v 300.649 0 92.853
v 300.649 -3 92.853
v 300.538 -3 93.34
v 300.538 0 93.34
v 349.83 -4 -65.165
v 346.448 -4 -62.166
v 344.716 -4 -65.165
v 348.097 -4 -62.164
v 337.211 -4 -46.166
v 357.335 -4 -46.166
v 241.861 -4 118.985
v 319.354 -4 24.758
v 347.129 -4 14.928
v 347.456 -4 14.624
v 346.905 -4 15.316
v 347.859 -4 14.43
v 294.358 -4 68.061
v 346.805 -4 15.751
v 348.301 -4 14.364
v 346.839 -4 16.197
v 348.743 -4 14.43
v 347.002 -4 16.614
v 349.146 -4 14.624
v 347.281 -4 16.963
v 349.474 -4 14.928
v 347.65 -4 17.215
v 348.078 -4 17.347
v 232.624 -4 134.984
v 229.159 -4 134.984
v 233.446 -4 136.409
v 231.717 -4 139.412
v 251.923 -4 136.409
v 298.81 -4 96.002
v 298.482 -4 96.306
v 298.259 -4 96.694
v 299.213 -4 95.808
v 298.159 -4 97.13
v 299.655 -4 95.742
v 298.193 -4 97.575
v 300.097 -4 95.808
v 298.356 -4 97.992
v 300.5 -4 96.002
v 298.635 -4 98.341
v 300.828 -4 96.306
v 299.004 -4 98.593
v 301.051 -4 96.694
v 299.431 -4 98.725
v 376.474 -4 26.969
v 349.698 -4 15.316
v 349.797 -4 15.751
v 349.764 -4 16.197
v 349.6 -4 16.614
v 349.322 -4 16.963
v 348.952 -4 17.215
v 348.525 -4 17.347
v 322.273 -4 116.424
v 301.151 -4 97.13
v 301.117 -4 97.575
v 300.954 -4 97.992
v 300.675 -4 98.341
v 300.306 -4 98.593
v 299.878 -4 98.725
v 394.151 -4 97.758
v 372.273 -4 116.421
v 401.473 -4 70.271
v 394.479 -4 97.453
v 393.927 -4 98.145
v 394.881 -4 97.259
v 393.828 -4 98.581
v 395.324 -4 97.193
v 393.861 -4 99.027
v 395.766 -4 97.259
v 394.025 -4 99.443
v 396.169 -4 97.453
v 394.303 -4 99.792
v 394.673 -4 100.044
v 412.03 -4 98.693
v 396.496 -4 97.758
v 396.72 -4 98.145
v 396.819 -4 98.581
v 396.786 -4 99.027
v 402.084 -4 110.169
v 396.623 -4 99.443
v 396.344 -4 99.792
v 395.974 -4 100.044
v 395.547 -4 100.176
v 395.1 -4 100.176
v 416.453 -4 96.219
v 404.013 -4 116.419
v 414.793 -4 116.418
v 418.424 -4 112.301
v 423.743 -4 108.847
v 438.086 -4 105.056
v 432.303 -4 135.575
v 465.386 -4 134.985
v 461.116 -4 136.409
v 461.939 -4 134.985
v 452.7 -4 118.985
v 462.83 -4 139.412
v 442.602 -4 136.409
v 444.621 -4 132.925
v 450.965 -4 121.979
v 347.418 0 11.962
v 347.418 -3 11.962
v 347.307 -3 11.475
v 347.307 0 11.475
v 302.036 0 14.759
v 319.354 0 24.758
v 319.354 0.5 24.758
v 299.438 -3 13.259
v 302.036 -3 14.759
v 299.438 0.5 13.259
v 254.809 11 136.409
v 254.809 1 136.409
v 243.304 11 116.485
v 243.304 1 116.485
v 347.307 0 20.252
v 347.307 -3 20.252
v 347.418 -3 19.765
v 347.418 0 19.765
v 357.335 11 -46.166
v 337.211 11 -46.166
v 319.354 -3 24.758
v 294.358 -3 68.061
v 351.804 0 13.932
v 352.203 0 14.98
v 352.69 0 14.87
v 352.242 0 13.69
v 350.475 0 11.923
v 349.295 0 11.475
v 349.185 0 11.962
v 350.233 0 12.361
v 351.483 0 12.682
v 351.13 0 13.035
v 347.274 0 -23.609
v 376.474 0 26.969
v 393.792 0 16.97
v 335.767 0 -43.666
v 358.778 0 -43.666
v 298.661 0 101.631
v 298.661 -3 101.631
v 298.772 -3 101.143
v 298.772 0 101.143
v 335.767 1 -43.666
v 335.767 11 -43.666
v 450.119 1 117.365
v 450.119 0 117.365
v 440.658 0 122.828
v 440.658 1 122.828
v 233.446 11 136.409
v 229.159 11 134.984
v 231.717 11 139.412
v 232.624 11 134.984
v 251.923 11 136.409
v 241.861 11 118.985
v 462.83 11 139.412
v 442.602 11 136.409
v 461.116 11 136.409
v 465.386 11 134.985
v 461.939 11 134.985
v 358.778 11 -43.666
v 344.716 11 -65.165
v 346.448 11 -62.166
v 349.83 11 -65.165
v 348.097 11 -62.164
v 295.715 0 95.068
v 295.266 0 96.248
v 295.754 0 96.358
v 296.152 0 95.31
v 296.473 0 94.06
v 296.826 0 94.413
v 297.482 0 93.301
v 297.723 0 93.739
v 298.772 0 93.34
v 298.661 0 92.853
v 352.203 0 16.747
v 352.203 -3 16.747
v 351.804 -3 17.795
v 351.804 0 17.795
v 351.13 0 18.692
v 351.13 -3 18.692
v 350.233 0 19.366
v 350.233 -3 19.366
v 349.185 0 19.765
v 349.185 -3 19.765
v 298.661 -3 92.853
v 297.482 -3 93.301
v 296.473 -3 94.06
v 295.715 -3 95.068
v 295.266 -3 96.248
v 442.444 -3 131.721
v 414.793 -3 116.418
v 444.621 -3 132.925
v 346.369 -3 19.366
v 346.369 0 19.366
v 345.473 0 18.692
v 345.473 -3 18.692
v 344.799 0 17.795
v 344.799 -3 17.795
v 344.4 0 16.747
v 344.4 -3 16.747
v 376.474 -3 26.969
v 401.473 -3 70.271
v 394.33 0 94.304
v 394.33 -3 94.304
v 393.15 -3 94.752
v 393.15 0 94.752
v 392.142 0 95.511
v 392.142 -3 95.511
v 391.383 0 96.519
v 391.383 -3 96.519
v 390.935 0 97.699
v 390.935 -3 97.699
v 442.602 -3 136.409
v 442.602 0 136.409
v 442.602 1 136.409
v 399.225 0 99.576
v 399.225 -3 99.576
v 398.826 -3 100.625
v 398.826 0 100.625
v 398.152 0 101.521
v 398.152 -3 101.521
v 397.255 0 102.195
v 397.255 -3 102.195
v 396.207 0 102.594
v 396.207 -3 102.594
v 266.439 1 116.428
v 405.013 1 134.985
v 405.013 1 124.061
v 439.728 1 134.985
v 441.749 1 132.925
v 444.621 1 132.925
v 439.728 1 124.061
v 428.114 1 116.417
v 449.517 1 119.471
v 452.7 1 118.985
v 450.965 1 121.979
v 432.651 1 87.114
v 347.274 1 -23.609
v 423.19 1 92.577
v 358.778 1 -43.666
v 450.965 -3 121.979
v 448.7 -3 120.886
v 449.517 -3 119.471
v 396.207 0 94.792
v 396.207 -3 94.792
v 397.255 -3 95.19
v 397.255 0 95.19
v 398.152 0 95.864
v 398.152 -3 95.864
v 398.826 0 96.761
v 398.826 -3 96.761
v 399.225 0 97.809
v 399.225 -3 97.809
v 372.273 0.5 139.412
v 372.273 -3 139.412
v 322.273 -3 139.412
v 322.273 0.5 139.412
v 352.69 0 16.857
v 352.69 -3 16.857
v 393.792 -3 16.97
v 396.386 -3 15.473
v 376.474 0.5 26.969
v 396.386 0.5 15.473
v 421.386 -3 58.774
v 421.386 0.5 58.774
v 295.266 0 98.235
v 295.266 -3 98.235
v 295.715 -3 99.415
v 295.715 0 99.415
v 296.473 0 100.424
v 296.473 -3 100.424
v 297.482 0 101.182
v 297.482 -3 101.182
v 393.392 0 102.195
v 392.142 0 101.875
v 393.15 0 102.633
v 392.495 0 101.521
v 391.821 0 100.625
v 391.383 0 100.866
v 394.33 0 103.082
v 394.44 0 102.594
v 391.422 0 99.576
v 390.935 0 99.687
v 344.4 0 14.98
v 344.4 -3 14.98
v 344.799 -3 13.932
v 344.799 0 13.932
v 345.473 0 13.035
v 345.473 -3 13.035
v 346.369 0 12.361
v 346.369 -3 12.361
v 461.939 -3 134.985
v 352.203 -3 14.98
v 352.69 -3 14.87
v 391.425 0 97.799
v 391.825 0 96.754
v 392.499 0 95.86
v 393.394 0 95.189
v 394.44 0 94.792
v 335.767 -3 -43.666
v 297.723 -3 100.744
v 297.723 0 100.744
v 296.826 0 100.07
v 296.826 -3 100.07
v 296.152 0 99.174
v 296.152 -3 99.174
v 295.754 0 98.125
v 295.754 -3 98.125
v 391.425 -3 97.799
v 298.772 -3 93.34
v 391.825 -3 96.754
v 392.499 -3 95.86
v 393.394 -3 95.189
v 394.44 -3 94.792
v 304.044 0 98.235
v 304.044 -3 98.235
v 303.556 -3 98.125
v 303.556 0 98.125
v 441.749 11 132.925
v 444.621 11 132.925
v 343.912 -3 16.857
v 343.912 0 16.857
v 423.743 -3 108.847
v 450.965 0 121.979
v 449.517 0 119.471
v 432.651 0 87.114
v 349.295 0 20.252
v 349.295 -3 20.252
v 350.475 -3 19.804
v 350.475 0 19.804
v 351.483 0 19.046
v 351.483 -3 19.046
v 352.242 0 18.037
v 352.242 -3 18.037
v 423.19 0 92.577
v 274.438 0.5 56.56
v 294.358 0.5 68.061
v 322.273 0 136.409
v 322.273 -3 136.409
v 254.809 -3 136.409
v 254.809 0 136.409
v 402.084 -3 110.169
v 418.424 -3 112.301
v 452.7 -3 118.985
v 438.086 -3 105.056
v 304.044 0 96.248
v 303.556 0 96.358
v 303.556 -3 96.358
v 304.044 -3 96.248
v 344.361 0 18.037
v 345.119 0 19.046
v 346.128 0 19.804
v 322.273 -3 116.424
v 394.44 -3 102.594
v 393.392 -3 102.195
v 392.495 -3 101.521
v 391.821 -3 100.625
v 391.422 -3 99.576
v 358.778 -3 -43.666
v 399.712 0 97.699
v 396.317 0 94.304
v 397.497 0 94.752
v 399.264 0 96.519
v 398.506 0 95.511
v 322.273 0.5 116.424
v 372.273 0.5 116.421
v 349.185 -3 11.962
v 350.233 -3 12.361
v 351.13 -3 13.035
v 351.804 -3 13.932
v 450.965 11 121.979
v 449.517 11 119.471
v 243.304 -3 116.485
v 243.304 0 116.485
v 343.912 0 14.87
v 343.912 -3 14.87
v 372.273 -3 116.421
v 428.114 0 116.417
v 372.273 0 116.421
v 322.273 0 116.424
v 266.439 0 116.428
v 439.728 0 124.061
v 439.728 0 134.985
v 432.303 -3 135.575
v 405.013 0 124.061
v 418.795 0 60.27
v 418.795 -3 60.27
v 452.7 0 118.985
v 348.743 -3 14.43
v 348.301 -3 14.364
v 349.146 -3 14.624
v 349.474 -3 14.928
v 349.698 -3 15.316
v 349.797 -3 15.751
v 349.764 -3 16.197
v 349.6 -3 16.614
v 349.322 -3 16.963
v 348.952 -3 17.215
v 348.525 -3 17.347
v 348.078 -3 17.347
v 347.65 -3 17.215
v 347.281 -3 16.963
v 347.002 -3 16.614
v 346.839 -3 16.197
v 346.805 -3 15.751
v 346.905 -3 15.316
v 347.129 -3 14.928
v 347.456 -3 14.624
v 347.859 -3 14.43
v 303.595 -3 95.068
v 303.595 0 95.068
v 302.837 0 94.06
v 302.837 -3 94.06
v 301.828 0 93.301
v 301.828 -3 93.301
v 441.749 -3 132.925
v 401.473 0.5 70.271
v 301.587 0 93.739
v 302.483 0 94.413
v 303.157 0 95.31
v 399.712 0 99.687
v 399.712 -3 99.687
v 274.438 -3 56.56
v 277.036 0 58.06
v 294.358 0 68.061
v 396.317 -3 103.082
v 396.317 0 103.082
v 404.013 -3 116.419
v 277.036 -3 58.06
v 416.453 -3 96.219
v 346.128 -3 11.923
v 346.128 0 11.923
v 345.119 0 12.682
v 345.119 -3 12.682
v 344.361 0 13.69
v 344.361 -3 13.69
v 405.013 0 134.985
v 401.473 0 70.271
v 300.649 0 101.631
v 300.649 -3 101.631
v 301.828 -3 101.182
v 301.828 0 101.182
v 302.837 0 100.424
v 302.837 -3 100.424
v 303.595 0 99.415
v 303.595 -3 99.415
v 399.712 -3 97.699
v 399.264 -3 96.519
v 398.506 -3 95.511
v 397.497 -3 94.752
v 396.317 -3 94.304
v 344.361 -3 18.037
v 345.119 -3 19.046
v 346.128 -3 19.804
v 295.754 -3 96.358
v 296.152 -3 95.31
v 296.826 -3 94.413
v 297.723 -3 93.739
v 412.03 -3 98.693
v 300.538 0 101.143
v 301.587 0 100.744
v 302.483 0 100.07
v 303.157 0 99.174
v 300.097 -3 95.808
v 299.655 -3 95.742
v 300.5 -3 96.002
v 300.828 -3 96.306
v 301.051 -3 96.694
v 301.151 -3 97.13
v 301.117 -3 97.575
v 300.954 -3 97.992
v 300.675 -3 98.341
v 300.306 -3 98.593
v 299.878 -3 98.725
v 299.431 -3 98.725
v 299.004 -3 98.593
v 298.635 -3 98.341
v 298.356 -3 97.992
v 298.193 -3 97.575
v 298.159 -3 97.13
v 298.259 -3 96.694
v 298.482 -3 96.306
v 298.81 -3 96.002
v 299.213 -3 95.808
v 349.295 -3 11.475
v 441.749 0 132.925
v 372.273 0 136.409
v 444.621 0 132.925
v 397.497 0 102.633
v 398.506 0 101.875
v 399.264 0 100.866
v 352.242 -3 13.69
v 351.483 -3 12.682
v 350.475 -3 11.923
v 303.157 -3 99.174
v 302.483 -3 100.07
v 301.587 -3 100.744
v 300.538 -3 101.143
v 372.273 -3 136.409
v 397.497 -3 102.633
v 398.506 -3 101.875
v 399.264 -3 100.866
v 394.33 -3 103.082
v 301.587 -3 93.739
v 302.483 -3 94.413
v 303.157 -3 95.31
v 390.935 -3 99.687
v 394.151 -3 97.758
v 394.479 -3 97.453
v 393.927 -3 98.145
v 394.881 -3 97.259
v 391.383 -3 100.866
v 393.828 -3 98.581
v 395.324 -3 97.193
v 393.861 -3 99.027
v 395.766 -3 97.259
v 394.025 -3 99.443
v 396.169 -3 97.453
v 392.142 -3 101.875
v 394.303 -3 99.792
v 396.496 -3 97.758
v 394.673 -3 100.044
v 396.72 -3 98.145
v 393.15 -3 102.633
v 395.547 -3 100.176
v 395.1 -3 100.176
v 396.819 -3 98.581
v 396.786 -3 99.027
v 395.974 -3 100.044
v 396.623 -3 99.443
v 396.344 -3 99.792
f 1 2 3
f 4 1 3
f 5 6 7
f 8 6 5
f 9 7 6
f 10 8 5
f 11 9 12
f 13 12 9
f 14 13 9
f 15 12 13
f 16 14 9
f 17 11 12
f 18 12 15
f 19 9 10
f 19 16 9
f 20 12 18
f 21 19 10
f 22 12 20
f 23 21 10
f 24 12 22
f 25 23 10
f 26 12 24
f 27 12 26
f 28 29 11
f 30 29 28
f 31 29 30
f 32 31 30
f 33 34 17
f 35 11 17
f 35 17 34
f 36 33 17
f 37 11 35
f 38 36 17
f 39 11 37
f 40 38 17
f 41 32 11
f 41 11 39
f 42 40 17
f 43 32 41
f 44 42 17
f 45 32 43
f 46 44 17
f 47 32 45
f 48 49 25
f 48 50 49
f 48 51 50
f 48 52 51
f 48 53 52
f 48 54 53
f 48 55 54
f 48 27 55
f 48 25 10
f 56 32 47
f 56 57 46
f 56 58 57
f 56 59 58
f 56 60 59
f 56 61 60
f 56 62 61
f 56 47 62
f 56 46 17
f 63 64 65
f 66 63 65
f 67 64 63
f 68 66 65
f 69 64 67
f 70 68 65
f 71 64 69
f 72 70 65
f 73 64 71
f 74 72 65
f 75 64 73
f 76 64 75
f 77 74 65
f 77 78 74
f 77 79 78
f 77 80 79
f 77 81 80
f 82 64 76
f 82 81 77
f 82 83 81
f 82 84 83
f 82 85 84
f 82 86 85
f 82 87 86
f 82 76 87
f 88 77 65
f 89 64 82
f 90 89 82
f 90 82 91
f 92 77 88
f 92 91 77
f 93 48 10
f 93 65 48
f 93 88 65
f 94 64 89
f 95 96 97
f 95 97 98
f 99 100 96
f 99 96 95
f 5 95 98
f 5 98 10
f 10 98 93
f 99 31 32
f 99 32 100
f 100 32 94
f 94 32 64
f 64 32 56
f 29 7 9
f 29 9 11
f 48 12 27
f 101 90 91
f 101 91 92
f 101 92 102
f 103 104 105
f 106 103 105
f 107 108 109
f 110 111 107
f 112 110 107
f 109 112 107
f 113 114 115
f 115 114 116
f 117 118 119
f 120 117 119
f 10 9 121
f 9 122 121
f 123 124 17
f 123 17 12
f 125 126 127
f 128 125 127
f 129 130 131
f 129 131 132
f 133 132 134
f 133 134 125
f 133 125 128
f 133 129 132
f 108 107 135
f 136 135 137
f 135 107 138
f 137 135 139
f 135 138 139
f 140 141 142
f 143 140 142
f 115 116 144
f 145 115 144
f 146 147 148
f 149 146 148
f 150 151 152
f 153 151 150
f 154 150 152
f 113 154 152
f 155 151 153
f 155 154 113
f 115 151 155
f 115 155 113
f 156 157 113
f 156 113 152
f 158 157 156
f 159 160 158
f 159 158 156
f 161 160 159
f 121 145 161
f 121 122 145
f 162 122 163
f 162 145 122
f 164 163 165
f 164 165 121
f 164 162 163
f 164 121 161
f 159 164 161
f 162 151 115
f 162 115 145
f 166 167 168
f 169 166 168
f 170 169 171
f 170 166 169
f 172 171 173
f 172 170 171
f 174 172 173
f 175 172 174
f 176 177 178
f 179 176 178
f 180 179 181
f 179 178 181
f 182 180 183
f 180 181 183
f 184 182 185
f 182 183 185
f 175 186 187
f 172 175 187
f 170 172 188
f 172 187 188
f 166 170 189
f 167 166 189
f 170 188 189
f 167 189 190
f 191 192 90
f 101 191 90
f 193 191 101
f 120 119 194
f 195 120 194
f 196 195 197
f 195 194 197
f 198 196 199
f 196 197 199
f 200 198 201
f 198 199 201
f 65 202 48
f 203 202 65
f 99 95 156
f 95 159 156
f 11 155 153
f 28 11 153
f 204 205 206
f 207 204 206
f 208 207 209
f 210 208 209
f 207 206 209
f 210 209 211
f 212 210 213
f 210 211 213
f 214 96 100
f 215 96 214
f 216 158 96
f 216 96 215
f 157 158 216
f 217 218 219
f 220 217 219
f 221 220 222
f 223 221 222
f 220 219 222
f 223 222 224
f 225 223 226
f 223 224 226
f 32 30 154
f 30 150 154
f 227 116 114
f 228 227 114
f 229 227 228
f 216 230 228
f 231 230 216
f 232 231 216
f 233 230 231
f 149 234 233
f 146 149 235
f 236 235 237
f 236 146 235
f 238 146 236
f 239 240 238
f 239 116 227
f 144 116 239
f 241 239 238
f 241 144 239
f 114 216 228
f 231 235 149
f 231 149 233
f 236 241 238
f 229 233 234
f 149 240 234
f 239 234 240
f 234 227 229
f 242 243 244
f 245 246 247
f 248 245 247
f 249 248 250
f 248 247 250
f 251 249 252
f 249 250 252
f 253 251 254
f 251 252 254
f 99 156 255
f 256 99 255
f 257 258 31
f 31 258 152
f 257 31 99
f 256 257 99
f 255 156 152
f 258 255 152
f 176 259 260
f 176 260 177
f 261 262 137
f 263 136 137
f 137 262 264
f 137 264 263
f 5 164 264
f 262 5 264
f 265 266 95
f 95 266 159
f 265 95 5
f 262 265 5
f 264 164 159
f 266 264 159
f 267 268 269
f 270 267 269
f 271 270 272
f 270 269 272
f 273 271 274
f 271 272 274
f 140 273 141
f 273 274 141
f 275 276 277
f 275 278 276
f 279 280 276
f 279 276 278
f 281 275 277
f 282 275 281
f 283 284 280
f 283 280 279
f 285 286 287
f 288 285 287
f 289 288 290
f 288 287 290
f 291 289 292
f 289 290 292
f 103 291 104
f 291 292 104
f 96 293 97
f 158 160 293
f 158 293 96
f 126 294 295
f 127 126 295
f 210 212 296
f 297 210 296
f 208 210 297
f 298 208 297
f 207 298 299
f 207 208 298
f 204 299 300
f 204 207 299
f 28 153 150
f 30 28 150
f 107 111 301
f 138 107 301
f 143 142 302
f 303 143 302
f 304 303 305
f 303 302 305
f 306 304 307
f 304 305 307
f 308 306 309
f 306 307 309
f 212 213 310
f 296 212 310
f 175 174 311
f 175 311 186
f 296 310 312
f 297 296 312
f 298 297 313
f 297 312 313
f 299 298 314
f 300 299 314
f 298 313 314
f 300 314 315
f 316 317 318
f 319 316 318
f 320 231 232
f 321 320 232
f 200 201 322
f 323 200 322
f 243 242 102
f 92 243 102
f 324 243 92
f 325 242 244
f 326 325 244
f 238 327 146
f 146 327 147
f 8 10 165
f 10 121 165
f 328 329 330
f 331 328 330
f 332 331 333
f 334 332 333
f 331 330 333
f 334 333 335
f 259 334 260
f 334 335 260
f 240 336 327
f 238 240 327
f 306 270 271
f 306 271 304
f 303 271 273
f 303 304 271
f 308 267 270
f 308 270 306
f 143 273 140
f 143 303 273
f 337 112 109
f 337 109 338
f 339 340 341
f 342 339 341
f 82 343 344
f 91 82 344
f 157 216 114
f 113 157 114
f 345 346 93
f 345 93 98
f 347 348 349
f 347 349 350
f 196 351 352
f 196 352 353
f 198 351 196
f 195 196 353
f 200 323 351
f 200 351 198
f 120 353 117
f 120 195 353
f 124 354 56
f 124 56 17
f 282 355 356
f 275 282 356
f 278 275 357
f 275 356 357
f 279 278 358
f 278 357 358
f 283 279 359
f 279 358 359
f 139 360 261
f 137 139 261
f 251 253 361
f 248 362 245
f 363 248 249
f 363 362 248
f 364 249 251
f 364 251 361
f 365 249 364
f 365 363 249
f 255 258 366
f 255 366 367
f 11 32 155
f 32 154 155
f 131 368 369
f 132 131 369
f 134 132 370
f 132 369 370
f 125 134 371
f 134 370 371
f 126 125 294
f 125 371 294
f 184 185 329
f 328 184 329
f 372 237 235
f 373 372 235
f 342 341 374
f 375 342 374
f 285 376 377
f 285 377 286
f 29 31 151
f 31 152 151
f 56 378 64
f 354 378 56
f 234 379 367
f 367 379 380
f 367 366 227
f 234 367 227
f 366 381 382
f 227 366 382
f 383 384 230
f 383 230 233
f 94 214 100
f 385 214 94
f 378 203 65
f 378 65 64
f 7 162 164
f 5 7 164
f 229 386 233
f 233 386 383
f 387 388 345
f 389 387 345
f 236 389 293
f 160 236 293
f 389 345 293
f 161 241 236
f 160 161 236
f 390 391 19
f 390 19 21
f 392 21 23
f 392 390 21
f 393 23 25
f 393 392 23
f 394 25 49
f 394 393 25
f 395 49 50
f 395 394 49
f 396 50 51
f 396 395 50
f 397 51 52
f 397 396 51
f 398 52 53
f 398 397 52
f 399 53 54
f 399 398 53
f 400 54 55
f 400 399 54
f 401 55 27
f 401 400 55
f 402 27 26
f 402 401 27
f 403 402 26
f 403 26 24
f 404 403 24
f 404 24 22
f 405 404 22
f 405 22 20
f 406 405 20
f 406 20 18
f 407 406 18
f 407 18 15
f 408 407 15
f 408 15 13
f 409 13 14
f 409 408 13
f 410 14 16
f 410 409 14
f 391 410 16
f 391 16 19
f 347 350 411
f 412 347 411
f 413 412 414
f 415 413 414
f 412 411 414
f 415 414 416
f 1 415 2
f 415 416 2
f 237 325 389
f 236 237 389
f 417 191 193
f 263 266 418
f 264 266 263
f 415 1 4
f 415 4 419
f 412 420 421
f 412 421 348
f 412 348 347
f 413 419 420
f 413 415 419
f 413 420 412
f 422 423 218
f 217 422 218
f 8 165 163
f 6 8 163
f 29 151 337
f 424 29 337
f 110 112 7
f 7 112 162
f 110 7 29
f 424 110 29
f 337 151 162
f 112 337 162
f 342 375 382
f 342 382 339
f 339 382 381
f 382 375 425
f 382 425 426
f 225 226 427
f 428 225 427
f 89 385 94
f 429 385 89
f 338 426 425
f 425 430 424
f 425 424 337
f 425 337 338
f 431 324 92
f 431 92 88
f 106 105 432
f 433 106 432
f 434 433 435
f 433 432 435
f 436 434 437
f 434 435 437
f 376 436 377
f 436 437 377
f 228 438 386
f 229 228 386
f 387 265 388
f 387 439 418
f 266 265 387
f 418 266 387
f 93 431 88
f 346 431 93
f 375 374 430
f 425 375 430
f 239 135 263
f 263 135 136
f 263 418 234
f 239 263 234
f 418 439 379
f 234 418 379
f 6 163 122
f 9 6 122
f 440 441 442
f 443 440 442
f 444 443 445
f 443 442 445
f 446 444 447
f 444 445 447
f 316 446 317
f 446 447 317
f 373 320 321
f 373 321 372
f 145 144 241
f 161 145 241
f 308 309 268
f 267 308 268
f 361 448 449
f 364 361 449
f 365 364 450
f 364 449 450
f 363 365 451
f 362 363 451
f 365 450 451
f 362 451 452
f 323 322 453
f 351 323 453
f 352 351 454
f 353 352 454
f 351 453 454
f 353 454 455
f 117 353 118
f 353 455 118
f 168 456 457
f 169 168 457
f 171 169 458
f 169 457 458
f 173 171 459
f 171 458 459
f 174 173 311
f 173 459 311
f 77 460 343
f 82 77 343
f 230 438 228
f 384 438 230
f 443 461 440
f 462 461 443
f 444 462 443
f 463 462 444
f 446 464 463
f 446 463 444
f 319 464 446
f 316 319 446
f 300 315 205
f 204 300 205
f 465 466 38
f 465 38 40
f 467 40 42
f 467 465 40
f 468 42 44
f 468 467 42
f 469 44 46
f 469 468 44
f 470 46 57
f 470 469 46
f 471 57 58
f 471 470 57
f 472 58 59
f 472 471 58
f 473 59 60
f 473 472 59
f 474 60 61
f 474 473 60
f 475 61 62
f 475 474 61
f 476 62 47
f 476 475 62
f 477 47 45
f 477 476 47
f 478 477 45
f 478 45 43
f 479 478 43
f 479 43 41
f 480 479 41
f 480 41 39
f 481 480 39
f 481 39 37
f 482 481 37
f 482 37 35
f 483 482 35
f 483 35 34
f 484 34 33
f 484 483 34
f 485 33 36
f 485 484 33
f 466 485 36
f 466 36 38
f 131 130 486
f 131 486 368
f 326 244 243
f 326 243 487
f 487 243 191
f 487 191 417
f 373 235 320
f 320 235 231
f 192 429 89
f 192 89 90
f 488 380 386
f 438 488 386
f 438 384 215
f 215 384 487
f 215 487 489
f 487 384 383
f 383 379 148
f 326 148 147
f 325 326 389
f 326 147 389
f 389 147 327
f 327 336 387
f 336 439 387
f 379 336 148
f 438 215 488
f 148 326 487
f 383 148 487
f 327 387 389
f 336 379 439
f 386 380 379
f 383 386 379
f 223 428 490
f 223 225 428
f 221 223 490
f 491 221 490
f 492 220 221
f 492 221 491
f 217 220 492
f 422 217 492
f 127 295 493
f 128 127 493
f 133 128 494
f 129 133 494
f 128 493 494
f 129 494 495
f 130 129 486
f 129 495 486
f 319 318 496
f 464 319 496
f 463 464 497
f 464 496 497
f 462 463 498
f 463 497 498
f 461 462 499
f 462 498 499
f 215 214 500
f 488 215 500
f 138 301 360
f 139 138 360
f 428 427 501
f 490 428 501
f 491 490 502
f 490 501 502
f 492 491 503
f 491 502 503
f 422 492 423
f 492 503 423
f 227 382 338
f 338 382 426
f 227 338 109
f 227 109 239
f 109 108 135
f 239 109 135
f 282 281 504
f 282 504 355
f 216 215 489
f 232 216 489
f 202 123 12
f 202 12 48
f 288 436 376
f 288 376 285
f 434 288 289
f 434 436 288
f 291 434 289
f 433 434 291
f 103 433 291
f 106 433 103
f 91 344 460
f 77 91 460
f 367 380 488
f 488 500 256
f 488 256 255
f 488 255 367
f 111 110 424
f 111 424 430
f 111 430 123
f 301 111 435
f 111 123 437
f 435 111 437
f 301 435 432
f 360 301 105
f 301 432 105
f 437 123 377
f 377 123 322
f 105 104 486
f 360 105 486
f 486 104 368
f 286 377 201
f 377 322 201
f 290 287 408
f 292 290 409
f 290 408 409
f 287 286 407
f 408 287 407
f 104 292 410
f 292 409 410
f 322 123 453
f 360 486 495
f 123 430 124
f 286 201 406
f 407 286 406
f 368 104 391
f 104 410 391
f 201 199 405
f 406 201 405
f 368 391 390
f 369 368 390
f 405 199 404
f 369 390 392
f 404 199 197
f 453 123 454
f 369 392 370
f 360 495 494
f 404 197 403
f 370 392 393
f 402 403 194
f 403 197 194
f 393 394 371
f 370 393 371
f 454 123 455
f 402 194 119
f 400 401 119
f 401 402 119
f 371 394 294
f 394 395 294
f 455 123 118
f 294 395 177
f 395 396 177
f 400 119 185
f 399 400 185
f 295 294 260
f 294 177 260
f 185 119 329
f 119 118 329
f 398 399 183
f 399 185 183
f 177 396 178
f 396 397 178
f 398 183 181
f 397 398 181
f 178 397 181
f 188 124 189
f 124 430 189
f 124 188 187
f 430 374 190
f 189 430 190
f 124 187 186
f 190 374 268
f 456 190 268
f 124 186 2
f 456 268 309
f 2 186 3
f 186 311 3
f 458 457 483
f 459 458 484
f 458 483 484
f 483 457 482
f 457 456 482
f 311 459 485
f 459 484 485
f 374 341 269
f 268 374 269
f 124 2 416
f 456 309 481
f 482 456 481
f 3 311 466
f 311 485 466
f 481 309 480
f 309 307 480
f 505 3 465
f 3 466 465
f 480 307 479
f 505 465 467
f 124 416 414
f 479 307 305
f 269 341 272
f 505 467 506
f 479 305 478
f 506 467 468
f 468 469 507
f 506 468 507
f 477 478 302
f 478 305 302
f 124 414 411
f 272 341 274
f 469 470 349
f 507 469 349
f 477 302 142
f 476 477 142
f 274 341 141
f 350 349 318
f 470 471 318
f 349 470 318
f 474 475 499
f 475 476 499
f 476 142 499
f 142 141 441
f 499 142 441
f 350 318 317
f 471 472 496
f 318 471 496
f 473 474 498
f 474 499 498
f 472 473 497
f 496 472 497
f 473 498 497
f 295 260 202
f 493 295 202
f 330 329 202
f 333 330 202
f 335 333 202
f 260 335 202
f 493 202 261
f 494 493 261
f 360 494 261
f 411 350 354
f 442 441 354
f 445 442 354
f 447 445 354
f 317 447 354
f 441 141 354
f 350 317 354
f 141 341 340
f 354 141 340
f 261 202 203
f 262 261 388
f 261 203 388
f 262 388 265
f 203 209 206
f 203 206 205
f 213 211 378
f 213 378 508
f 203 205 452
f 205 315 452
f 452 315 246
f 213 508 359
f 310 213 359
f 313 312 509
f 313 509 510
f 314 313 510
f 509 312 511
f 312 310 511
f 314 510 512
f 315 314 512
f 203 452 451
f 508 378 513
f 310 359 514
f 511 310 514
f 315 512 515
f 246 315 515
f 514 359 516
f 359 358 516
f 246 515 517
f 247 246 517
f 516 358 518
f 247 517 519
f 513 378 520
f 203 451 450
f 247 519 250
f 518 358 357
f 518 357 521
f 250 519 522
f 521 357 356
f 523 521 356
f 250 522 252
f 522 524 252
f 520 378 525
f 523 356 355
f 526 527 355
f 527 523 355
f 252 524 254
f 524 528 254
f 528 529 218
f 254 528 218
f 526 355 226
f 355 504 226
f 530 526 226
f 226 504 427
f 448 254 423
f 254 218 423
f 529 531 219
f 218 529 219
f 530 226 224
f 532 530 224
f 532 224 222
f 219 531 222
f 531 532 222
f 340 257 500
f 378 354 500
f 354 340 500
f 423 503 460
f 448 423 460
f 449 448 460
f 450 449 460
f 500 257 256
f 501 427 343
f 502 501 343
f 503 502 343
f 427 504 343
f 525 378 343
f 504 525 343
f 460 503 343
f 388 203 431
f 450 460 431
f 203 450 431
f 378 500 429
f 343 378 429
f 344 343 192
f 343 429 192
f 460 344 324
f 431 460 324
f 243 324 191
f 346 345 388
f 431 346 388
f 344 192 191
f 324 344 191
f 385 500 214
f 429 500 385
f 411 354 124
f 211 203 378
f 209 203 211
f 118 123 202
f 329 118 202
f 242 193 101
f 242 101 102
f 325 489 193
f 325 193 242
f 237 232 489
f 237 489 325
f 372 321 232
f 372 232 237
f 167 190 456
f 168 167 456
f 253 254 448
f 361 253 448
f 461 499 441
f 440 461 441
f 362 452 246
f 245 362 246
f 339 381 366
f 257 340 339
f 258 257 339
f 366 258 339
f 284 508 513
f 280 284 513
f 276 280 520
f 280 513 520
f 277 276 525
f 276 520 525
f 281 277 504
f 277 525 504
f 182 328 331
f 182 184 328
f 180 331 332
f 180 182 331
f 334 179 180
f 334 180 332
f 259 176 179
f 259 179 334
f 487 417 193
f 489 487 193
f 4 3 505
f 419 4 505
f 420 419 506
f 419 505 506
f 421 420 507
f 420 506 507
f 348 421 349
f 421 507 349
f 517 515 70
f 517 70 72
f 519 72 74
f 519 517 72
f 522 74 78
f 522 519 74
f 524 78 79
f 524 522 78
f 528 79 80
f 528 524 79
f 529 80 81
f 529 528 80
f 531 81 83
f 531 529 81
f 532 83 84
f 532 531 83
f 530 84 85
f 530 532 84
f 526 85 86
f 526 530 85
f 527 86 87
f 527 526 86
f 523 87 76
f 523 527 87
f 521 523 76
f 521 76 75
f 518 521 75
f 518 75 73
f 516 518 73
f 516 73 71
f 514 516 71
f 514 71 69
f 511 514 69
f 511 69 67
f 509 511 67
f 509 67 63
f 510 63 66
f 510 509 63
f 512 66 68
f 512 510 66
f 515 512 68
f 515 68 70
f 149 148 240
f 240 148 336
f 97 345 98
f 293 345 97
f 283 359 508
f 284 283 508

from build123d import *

# Parameters (mm, degrees)
SKETCH1_W                = 34.714871787
SKETCH1_H                = 10.923666426
BOSS_EXTRUDE1_DEPTH      = 1
BOSS_EXTRUDE2_DEPTH      = 11
BOSS_EXTRUDE3_DEPTH      = 5
BOSS_EXTRUDE3_DEPTH_BACK = 3
SKETCH3_W                = 50
SKETCH3_H                = 7
CUT_EXTRUDE3_DEPTH       = 25
SKETCH5_W                = 50
SKETCH5_H                = 7
CUT_EXTRUDE4_DEPTH       = 25
SKETCH6_W                = 50
SKETCH6_H                = 7
CUT_EXTRUDE5_DEPTH       = 25
SKETCH8_R                = 1.5
BOSS_EXTRUDE5_DEPTH      = 1
BOSS_EXTRUDE10_DEPTH     = 3


with BuildPart() as part:
    # Sketch1 → Boss-Extrude1 (new body)
    with BuildSketch(Plane(origin=(0, 0, 0), x_dir=(1, 0, 0), z_dir=(0, 1, 0))):
        Polygon((243.304219775, -116.484791865), (254.809280577, -136.408896137), (442.602090749, -136.409305398), (444.621046679, -132.925433224), (441.749040748, -132.925433224), (449.516726724, -119.471406458), (450.964695298, -121.978953123), (452.699916622, -118.984688018), (358.778179036, 43.666038065), (335.767496284, 43.666038065), align=None)
        with Locations((422.370878913, -129.522754792)):
            Rectangle(SKETCH1_W, SKETCH1_H, mode=Mode.SUBTRACT)
        Polygon((423.190377512, -92.577472767), (432.651287025, -87.114324326), (450.119365975, -117.364996826), (440.658456462, -122.828145267), align=None, mode=Mode.SUBTRACT)
        Polygon((428.113670919, -116.417164681), (266.439108268, -116.428009237), (347.273609729, 23.609230821), align=None, mode=Mode.SUBTRACT)
    extrude(amount=BOSS_EXTRUDE1_DEPTH)

    # Sketch1<9> → Boss-Extrude2 (add)
    # profile 1 of 2: a face of its own
    with BuildSketch(Plane(origin=(0, 0, 0), x_dir=(1, 0, 0), z_dir=(0, 1, 0))):
        Polygon((229.159432548, -134.984249184), (231.716666588, -139.412373829), (462.829865412, -139.412373829), (465.38624875, -134.984588004), (349.829542096, 65.165499075), (344.716133219, 65.165499075), align=None)
        Polygon((251.922647989, -136.409305399), (233.446303401, -136.408896138), (232.62355396, -134.984217357), (241.860901689, -118.984688018), align=None, mode=Mode.SUBTRACT)
        Polygon((442.602090749, -136.409305398), (254.809280577, -136.408896137), (243.304219775, -116.484791865), (335.767496284, 43.666038065), (358.778179036, 43.666038065), (461.938967958, -134.984588006), (461.116393749, -136.409305398), align=None, mode=Mode.SUBTRACT)
        Polygon((348.096628302, 62.164013367), (357.334800991, 46.166038067), (337.210874326, 46.166038067), (346.44844193, 62.165948237), align=None, mode=Mode.SUBTRACT)
    # profile 2 of 2: a face of its own
    with BuildSketch(Plane(origin=(0, 0, 0), x_dir=(1, 0, 0), z_dir=(0, 1, 0))):
        Polygon((441.749040748, -132.925433224), (444.621046679, -132.925433224), (450.964695298, -121.978953123), (449.516726724, -119.471406458), align=None)
    extrude(amount=BOSS_EXTRUDE2_DEPTH)

    # Sketch1<10> → Boss-Extrude3 (add, two sides: drawn at the far end of the back side and taken through both)
    # profile 1 of 2: a face of its own
    with BuildSketch(Plane(origin=(0, 0, 0), x_dir=(1, 0, 0), z_dir=(0, 1, 0)).offset(-BOSS_EXTRUDE3_DEPTH_BACK)):
        Polygon((229.159432548, -134.984249184), (231.716666588, -139.412373829), (462.829865412, -139.412373829), (465.38624875, -134.984588004), (349.829542096, 65.165499075), (344.716133219, 65.165499075), align=None)
        Polygon((251.922647989, -136.409305399), (233.446303401, -136.408896138), (232.62355396, -134.984217357), (241.860901689, -118.984688018), align=None, mode=Mode.SUBTRACT)
        Polygon((442.602090749, -136.409305398), (254.809280577, -136.408896137), (243.304219775, -116.484791865), (335.767496284, 43.666038065), (358.778179036, 43.666038065), (461.938967958, -134.984588006), (461.116393749, -136.409305398), align=None, mode=Mode.SUBTRACT)
        Polygon((348.096628302, 62.164013367), (357.334800991, 46.166038067), (337.210874326, 46.166038067), (346.44844193, 62.165948237), align=None, mode=Mode.SUBTRACT)
    # profile 2 of 2: a face of its own
    with BuildSketch(Plane(origin=(0, 0, 0), x_dir=(1, 0, 0), z_dir=(0, 1, 0)).offset(-BOSS_EXTRUDE3_DEPTH_BACK)):
        Polygon((441.749040748, -132.925433224), (444.621046679, -132.925433224), (450.964695298, -121.978953123), (449.516726724, -119.471406458), align=None)
    extrude(amount=BOSS_EXTRUDE3_DEPTH + BOSS_EXTRUDE3_DEPTH_BACK)

    # Sketch3 → Cut-Extrude3 (cut)
    with BuildSketch(Plane(origin=(290.589645397, 0, -167.772009994), x_dir=(-0.49999999999998745, 0, -0.8660254037844459), z_dir=(0.8660254037844459, 0, -0.49999999999998745))):
        with Locations((-236.592990632, -3)):
            Rectangle(SKETCH3_W, SKETCH3_H)
    extrude(amount=-CUT_EXTRUDE3_DEPTH, mode=Mode.SUBTRACT)

    # Sketch5 → Cut-Extrude4 (cut)
    with BuildSketch(Plane.XY.offset(139.412373829)):
        with Locations((347.273266, -3)):
            Rectangle(SKETCH5_W, SKETCH5_H)
    extrude(amount=-CUT_EXTRUDE4_DEPTH, mode=Mode.SUBTRACT)

    # Sketch6 → Cut-Extrude5 (cut)
    with BuildSketch(Plane(origin=(230.319375798, 0, 132.975171837), x_dir=(-0.5000006154012504, 0, 0.8660250484820695), z_dir=(-0.8660250484820695, 0, -0.5000006154012504))):
        with Locations((-113.236674799, -3)):
            Rectangle(SKETCH6_W, SKETCH6_H)
    extrude(amount=-CUT_EXTRUDE5_DEPTH, mode=Mode.SUBTRACT)

    # Sketch8 → Boss-Extrude5 (add)
    with BuildSketch(Plane.XZ.offset(3)):
        Polygon((349.829542096, -65.165499075), (465.38624875, 134.984588004), (462.829865412, 139.412373829), (231.716666588, 139.412373829), (229.159432548, 134.984249184), (344.716133219, -65.165499075), align=None)
        with Locations((395.323540807, 98.692824234)):
            Circle(SKETCH8_R, mode=Mode.SUBTRACT)
        with Locations((348.301285091, 15.863526629)):
            Circle(SKETCH8_R, mode=Mode.SUBTRACT)
        with Locations((299.654911442, 97.24168178)):
            Circle(SKETCH8_R, mode=Mode.SUBTRACT)
        Polygon((414.793175166, 116.418058172), (444.621046679, 132.925433224), (450.964695298, 121.978953123), (423.743256024, 108.846989255), (416.453113266, 96.21943309), (438.086080689, 105.056150836), (452.699916622, 118.984688018), (461.938967958, 134.984588006), (461.116393749, 136.409305398), (442.602090749, 136.409305398), (432.302823198, 135.574995335), (404.013141868, 116.418781259), align=None, mode=Mode.SUBTRACT)
        Polygon((322.273266, 116.42426408), (294.358218631, 68.061097964), (319.354499367, 24.757680453), (376.473657316, 26.969372806), (401.47267951, 70.271207531), (372.273266, 116.420910257), align=None, mode=Mode.SUBTRACT)
        Polygon((233.446303401, 136.408896138), (251.922647989, 136.409305399), (241.860901689, 118.984688018), (232.62355396, 134.984217357), align=None, mode=Mode.SUBTRACT)
        Polygon((337.210874326, -46.166038067), (357.334800991, -46.166038067), (348.096628302, -62.164013367), (346.44844193, -62.165948237), align=None, mode=Mode.SUBTRACT)
        Polygon((418.423760883, 112.300563217), (412.029962691, 98.692824234), (402.084054392, 110.169297153), align=None, mode=Mode.SUBTRACT)
    extrude(amount=BOSS_EXTRUDE5_DEPTH)

    # Sketch12 → Boss-Extrude10 (add)
    with BuildSketch(Plane(origin=(0, -3, 0), x_dir=(1, 0, 0), z_dir=(0, 1, 0))):
        with BuildLine():
            ThreePointArc((352.690173981, -14.869718639), (351.483265607, -12.681546114), (349.295093082, -11.47463774))
            Line((349.295093081, -11.47463774), (349.184669971, -11.962292061))
            ThreePointArc((349.184669972, -11.962292061), (351.129712216, -13.035099504), (352.20251966, -14.980141749))
            Line((352.202519659, -14.980141749), (352.69017398, -14.869718639))
        make_face()
        with BuildLine():
            Line((347.417900211, -11.962292061), (347.307477101, -11.47463774))
            ThreePointArc((347.307477101, -11.47463774), (345.119304576, -12.681546114), (343.912396202, -14.869718639))
            Line((343.912396203, -14.869718639), (344.400050524, -14.980141749))
            ThreePointArc((344.400050523, -14.980141749), (345.472857967, -13.035099504), (347.417900211, -11.962292061))
        make_face()
        with BuildLine():
            ThreePointArc((349.295093082, -20.252415518), (351.483265607, -19.045507145), (352.690173981, -16.857334619))
            Line((352.69017398, -16.857334619), (352.202519659, -16.746911509))
            ThreePointArc((352.20251966, -16.746911509), (351.129712216, -18.691953754), (349.184669972, -19.764761197))
            Line((349.184669971, -19.764761197), (349.295093081, -20.252415518))
        make_face()
        with BuildLine():
            Line((344.400050524, -16.746911509), (343.912396203, -16.857334619))
            ThreePointArc((343.912396202, -16.857334619), (345.119304576, -19.045507145), (347.307477101, -20.252415518))
            Line((347.307477101, -20.252415518), (347.417900211, -19.764761197))
            ThreePointArc((347.417900211, -19.764761197), (345.472857967, -18.691953754), (344.400050523, -16.746911509))
        make_face()
        with BuildLine():
            Line((394.440155927, -94.791589666), (394.329732817, -94.303935345))
            ThreePointArc((394.329732817, -94.303935345), (392.141560292, -95.510843718), (390.934651918, -97.699016244))
            Line((390.934651918, -97.699016244), (391.4247896, -97.798542945))
            ThreePointArc((391.4247896, -97.798542945), (392.499067689, -95.860448622), (394.440155927, -94.791589666))
        make_face()
        with BuildLine():
            ThreePointArc((399.712429696, -97.699016244), (398.505521323, -95.510843718), (396.317348797, -94.303935345))
            Line((396.317348797, -94.303935345), (396.206925687, -94.791589666))
            ThreePointArc((396.206925687, -94.791589666), (398.151967932, -95.864397109), (399.224775375, -97.809439354))
            Line((399.224775375, -97.809439354), (399.712429696, -97.699016244))
        make_face()
        with BuildLine():
            Line((391.422306239, -99.576209114), (390.934651918, -99.686632224))
            ThreePointArc((390.934651918, -99.686632224), (392.141560292, -101.874804749), (394.329732817, -103.081713123))
            Line((394.329732817, -103.081713122), (394.440155927, -102.594058801))
            ThreePointArc((394.440155927, -102.594058802), (392.495113682, -101.521251358), (391.422306239, -99.576209114))
        make_face()
        with BuildLine():
            ThreePointArc((396.317348797, -103.081713123), (398.505521323, -101.874804749), (399.712429696, -99.686632224))
            Line((399.712429696, -99.686632224), (399.224775375, -99.576209114))
            ThreePointArc((399.224775375, -99.576209114), (398.151967932, -101.521251358), (396.206925687, -102.594058802))
            Line((396.206925687, -102.594058801), (396.317348797, -103.081713122))
        make_face()
        with BuildLine():
            ThreePointArc((298.661103452, -92.852792892), (296.472930927, -94.059701265), (295.266022553, -96.24787379))
            Line((295.266022553, -96.24787379), (295.753676874, -96.3582969))
            ThreePointArc((295.753676874, -96.3582969), (296.826484317, -94.413254656), (298.771526562, -93.340447213))
            Line((298.771526562, -93.340447212), (298.661103452, -92.852792891))
        make_face()
        with BuildLine():
            Line((295.753676874, -98.12506666), (295.266022553, -98.23548977))
            ThreePointArc((295.266022553, -98.23548977), (296.472930927, -100.423662295), (298.661103452, -101.630570669))
            Line((298.661103452, -101.630570669), (298.771526562, -101.142916348))
            ThreePointArc((298.771526562, -101.142916348), (296.826484317, -100.070108905), (295.753676874, -98.12506666))
        make_face()
        with BuildLine():
            ThreePointArc((304.04380033, -96.24787379), (302.836891957, -94.059701265), (300.648719432, -92.852792892))
            Line((300.648719432, -92.852792891), (300.538296322, -93.340447212))
            ThreePointArc((300.538296322, -93.340447213), (302.483338566, -94.413254656), (303.55614601, -96.3582969))
            Line((303.55614601, -96.3582969), (304.043800331, -96.24787379))
        make_face()
        with BuildLine():
            Line((300.538296322, -101.142916348), (300.648719432, -101.630570669))
            ThreePointArc((300.648719432, -101.630570669), (302.836891957, -100.423662295), (304.04380033, -98.23548977))
            Line((304.043800331, -98.23548977), (303.55614601, -98.12506666))
            ThreePointArc((303.55614601, -98.12506666), (302.483338566, -100.070108905), (300.538296322, -101.142916348))
        make_face()
    extrude(amount=BOSS_EXTRUDE10_DEPTH)


solid = part.part
